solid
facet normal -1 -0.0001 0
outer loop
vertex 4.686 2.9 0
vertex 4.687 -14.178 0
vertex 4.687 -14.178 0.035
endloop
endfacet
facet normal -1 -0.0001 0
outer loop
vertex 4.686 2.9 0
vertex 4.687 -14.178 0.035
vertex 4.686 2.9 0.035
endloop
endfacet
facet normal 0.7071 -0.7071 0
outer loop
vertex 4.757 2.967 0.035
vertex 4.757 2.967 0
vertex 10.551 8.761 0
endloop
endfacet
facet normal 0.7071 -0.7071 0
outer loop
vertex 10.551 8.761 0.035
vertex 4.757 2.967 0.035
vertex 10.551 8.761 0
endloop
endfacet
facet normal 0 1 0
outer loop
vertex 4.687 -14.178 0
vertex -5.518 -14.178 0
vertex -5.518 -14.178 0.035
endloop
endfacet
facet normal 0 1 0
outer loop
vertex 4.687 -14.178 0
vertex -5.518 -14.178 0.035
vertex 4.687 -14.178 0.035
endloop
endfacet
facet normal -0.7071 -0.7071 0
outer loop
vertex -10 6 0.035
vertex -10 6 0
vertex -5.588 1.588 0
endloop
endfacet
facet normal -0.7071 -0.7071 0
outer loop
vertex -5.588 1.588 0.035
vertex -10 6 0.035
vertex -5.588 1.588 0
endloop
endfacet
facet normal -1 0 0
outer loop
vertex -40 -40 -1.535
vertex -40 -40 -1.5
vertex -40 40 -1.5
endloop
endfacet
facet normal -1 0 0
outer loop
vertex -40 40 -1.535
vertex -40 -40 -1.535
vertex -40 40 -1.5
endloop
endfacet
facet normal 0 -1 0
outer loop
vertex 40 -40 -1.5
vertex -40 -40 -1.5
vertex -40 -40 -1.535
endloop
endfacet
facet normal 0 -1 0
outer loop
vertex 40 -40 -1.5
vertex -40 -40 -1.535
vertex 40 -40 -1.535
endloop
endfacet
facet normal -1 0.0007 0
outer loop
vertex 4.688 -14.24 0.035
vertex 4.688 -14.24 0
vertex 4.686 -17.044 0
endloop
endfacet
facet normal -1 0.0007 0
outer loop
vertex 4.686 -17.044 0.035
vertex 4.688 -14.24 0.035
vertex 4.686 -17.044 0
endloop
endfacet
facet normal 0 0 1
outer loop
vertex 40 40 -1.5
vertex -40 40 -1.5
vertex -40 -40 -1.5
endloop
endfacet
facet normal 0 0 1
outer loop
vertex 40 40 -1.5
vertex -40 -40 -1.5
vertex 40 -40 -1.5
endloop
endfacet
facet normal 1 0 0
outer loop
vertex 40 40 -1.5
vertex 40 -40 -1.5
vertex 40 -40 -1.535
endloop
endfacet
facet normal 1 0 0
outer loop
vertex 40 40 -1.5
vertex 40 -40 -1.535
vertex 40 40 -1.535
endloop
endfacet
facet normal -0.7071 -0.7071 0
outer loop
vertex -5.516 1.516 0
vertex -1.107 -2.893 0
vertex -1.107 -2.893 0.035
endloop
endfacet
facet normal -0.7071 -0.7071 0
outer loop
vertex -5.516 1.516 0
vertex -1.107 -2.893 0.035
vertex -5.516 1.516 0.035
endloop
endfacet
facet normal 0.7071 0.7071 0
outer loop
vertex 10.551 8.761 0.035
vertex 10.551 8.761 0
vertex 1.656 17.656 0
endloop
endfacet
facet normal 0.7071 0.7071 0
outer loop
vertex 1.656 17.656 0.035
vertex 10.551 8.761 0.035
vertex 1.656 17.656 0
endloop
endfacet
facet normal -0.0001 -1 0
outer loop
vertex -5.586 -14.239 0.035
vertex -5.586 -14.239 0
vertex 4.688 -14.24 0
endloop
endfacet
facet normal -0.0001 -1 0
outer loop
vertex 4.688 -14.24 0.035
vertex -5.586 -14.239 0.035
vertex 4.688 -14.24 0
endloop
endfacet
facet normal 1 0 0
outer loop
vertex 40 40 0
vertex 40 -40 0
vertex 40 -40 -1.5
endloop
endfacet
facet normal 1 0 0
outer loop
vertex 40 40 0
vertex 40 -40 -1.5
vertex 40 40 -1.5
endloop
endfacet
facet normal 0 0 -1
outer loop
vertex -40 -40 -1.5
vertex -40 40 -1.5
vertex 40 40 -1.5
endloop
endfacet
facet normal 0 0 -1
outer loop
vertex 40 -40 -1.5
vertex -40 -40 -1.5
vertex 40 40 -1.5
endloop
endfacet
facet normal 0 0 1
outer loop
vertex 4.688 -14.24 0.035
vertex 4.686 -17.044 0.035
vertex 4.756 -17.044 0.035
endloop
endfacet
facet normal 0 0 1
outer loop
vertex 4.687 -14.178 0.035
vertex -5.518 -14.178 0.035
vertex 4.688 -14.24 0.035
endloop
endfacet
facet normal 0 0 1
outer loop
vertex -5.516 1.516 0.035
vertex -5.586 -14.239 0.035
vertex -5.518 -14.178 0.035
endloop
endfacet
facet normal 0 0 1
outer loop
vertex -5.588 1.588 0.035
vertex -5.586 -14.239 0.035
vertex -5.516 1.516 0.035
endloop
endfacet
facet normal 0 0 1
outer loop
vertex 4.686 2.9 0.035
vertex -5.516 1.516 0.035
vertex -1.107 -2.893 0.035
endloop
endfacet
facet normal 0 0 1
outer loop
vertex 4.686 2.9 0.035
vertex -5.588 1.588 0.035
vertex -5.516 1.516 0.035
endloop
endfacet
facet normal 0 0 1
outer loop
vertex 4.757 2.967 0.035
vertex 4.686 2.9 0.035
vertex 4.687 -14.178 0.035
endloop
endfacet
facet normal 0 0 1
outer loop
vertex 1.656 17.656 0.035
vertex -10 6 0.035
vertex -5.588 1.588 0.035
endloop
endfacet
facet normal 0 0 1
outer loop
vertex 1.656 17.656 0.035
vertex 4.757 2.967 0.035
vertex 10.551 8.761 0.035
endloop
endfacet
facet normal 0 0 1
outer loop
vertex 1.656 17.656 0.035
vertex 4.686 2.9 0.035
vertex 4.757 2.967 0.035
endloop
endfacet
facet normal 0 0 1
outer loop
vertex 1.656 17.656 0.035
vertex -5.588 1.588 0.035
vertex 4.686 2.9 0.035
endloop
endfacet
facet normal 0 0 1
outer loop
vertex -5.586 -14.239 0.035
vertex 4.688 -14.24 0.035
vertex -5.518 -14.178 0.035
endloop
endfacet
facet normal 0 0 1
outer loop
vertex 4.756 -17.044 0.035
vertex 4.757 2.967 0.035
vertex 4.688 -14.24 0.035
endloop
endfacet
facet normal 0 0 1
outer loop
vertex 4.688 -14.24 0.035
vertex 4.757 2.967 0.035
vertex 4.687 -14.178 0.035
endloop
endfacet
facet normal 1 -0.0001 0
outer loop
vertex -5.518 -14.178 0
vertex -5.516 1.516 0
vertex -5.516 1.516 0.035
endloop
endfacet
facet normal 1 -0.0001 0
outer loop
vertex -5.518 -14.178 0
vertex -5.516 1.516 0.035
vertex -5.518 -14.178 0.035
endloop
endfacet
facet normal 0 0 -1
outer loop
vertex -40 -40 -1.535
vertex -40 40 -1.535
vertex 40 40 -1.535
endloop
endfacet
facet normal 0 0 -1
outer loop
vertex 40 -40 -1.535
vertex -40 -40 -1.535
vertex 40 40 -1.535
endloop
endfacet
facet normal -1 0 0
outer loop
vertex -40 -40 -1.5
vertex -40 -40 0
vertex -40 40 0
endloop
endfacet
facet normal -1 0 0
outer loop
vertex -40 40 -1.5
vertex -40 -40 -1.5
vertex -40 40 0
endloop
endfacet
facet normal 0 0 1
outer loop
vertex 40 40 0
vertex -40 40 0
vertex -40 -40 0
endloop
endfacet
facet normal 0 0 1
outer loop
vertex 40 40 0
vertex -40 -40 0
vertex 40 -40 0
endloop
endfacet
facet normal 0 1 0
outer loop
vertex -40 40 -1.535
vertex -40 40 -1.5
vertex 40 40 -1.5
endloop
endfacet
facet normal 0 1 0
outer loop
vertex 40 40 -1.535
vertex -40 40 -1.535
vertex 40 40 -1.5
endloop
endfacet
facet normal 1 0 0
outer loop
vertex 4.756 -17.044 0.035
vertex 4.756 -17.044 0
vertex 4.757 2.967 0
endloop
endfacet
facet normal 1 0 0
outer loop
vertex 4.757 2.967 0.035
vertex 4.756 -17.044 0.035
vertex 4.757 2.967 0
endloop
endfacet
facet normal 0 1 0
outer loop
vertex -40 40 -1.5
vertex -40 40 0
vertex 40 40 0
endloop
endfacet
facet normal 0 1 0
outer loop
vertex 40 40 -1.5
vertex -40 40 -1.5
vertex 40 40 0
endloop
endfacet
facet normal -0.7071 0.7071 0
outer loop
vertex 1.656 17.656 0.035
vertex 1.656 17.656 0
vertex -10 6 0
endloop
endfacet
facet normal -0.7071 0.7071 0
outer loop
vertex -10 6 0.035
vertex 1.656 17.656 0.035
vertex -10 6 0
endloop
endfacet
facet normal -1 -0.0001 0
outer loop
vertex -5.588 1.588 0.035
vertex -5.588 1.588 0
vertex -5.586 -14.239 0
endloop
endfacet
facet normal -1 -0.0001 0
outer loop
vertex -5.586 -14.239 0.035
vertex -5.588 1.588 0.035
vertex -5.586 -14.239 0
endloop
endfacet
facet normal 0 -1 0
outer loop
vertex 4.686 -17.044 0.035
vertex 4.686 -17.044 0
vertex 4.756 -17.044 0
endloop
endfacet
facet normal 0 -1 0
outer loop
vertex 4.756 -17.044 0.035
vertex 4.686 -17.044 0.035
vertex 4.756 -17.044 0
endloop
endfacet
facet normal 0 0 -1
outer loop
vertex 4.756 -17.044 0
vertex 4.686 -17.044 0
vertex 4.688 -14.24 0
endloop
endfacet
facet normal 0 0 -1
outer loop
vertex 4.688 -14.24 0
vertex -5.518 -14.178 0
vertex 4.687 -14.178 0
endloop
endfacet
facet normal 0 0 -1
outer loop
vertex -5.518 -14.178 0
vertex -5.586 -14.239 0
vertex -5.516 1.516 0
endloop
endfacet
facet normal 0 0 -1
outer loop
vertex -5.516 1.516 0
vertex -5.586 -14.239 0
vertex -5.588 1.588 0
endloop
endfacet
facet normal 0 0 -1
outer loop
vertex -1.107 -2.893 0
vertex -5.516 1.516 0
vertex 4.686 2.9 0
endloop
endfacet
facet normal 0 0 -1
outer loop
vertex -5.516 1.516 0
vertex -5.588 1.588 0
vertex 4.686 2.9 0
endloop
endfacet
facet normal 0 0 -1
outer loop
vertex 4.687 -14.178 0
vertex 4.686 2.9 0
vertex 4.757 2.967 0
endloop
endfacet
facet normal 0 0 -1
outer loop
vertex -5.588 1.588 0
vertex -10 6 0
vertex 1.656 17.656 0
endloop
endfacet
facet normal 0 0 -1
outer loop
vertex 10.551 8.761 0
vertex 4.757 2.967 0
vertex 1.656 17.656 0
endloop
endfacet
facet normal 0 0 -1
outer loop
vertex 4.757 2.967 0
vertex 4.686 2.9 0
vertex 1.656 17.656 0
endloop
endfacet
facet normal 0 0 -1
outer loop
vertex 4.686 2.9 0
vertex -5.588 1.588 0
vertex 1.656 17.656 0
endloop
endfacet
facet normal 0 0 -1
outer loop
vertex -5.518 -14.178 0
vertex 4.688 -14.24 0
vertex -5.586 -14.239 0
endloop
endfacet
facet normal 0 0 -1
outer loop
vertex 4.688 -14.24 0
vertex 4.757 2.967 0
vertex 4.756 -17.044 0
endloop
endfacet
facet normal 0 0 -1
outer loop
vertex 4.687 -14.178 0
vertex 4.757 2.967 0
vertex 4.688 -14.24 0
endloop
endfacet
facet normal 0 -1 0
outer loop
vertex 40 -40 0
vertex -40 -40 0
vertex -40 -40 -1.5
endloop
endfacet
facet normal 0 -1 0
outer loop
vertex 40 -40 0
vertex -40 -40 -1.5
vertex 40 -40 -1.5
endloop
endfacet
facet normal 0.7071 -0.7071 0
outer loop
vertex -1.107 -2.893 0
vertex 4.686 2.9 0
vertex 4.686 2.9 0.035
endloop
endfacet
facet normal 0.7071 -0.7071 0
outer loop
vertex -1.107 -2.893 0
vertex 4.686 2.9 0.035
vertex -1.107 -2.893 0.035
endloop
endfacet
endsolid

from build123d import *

# Parameters (mm, degrees)
EXTRUDE_DEPTH       = 0.035
EXTRUDE001_DEPTH    = 0.035
CUT_PLACEMENT_ANGLE = 45
SKETCH001_W         = 80
SKETCH001_H         = 80
EXTRUDE002_DEPTH    = 1.5
SKETCH004_W         = 80
SKETCH004_H         = 80
EXTRUDE003_DEPTH    = 0.035


with BuildPart() as extrude_body:
    # Sketch003 (on Sketch) → Extrude (new body)
    with BuildSketch(Plane.XY):
        Polygon((-11.098886, -17.437815), (-3.882812, -24.65353), (8.19241, -12.57608), (0, -12.57608), (0, -6.340836), align=None)
    extrude(amount=EXTRUDE_DEPTH)


with BuildPart() as antennasolid:
    # Sketch002 → Extrude001 (new body)
    with BuildSketch(Plane.XY):
        Polygon((0, 0), (0, -6.239947), (-11.189508, -17.432114), (-3.92562, -24.697956), (-5.910147, -26.67951), (-5.860354, -26.728765), (8.290281, -12.579739), (16.484316, -12.579739), (16.484316, 0), align=None)
    extrude(amount=EXTRUDE001_DEPTH)

    # Cut: cut Extrude body
    add(extrude_body.part, mode=Mode.SUBTRACT)


with BuildPart() as antennasolid_1:
    # Cut placement: moved
    add(antennasolid.part.moved(Location((-10, 6, 0))).rotate(Axis((-10, 6, 0), (0, 0, 1)), CUT_PLACEMENT_ANGLE))


with BuildPart() as substratesolid:
    # Sketch001 (on Sketch) → Extrude002 (new body)
    with BuildSketch(Plane.XY):
        Rectangle(SKETCH001_W, SKETCH001_H)
    extrude(amount=-EXTRUDE002_DEPTH)


with BuildPart() as gndsolid:
    # Sketch004 (on Sketch) → Extrude003 (new body)
    with BuildSketch(Plane.XY):
        Rectangle(SKETCH004_W, SKETCH004_H)
    extrude(amount=-EXTRUDE003_DEPTH)


with BuildPart() as gndsolid_1:
    # Extrude003 placement: moved
    add(gndsolid.part.moved(Location((0, 0, -1.5))))


solid = Compound([antennasolid_1.part, substratesolid.part, gndsolid_1.part])
